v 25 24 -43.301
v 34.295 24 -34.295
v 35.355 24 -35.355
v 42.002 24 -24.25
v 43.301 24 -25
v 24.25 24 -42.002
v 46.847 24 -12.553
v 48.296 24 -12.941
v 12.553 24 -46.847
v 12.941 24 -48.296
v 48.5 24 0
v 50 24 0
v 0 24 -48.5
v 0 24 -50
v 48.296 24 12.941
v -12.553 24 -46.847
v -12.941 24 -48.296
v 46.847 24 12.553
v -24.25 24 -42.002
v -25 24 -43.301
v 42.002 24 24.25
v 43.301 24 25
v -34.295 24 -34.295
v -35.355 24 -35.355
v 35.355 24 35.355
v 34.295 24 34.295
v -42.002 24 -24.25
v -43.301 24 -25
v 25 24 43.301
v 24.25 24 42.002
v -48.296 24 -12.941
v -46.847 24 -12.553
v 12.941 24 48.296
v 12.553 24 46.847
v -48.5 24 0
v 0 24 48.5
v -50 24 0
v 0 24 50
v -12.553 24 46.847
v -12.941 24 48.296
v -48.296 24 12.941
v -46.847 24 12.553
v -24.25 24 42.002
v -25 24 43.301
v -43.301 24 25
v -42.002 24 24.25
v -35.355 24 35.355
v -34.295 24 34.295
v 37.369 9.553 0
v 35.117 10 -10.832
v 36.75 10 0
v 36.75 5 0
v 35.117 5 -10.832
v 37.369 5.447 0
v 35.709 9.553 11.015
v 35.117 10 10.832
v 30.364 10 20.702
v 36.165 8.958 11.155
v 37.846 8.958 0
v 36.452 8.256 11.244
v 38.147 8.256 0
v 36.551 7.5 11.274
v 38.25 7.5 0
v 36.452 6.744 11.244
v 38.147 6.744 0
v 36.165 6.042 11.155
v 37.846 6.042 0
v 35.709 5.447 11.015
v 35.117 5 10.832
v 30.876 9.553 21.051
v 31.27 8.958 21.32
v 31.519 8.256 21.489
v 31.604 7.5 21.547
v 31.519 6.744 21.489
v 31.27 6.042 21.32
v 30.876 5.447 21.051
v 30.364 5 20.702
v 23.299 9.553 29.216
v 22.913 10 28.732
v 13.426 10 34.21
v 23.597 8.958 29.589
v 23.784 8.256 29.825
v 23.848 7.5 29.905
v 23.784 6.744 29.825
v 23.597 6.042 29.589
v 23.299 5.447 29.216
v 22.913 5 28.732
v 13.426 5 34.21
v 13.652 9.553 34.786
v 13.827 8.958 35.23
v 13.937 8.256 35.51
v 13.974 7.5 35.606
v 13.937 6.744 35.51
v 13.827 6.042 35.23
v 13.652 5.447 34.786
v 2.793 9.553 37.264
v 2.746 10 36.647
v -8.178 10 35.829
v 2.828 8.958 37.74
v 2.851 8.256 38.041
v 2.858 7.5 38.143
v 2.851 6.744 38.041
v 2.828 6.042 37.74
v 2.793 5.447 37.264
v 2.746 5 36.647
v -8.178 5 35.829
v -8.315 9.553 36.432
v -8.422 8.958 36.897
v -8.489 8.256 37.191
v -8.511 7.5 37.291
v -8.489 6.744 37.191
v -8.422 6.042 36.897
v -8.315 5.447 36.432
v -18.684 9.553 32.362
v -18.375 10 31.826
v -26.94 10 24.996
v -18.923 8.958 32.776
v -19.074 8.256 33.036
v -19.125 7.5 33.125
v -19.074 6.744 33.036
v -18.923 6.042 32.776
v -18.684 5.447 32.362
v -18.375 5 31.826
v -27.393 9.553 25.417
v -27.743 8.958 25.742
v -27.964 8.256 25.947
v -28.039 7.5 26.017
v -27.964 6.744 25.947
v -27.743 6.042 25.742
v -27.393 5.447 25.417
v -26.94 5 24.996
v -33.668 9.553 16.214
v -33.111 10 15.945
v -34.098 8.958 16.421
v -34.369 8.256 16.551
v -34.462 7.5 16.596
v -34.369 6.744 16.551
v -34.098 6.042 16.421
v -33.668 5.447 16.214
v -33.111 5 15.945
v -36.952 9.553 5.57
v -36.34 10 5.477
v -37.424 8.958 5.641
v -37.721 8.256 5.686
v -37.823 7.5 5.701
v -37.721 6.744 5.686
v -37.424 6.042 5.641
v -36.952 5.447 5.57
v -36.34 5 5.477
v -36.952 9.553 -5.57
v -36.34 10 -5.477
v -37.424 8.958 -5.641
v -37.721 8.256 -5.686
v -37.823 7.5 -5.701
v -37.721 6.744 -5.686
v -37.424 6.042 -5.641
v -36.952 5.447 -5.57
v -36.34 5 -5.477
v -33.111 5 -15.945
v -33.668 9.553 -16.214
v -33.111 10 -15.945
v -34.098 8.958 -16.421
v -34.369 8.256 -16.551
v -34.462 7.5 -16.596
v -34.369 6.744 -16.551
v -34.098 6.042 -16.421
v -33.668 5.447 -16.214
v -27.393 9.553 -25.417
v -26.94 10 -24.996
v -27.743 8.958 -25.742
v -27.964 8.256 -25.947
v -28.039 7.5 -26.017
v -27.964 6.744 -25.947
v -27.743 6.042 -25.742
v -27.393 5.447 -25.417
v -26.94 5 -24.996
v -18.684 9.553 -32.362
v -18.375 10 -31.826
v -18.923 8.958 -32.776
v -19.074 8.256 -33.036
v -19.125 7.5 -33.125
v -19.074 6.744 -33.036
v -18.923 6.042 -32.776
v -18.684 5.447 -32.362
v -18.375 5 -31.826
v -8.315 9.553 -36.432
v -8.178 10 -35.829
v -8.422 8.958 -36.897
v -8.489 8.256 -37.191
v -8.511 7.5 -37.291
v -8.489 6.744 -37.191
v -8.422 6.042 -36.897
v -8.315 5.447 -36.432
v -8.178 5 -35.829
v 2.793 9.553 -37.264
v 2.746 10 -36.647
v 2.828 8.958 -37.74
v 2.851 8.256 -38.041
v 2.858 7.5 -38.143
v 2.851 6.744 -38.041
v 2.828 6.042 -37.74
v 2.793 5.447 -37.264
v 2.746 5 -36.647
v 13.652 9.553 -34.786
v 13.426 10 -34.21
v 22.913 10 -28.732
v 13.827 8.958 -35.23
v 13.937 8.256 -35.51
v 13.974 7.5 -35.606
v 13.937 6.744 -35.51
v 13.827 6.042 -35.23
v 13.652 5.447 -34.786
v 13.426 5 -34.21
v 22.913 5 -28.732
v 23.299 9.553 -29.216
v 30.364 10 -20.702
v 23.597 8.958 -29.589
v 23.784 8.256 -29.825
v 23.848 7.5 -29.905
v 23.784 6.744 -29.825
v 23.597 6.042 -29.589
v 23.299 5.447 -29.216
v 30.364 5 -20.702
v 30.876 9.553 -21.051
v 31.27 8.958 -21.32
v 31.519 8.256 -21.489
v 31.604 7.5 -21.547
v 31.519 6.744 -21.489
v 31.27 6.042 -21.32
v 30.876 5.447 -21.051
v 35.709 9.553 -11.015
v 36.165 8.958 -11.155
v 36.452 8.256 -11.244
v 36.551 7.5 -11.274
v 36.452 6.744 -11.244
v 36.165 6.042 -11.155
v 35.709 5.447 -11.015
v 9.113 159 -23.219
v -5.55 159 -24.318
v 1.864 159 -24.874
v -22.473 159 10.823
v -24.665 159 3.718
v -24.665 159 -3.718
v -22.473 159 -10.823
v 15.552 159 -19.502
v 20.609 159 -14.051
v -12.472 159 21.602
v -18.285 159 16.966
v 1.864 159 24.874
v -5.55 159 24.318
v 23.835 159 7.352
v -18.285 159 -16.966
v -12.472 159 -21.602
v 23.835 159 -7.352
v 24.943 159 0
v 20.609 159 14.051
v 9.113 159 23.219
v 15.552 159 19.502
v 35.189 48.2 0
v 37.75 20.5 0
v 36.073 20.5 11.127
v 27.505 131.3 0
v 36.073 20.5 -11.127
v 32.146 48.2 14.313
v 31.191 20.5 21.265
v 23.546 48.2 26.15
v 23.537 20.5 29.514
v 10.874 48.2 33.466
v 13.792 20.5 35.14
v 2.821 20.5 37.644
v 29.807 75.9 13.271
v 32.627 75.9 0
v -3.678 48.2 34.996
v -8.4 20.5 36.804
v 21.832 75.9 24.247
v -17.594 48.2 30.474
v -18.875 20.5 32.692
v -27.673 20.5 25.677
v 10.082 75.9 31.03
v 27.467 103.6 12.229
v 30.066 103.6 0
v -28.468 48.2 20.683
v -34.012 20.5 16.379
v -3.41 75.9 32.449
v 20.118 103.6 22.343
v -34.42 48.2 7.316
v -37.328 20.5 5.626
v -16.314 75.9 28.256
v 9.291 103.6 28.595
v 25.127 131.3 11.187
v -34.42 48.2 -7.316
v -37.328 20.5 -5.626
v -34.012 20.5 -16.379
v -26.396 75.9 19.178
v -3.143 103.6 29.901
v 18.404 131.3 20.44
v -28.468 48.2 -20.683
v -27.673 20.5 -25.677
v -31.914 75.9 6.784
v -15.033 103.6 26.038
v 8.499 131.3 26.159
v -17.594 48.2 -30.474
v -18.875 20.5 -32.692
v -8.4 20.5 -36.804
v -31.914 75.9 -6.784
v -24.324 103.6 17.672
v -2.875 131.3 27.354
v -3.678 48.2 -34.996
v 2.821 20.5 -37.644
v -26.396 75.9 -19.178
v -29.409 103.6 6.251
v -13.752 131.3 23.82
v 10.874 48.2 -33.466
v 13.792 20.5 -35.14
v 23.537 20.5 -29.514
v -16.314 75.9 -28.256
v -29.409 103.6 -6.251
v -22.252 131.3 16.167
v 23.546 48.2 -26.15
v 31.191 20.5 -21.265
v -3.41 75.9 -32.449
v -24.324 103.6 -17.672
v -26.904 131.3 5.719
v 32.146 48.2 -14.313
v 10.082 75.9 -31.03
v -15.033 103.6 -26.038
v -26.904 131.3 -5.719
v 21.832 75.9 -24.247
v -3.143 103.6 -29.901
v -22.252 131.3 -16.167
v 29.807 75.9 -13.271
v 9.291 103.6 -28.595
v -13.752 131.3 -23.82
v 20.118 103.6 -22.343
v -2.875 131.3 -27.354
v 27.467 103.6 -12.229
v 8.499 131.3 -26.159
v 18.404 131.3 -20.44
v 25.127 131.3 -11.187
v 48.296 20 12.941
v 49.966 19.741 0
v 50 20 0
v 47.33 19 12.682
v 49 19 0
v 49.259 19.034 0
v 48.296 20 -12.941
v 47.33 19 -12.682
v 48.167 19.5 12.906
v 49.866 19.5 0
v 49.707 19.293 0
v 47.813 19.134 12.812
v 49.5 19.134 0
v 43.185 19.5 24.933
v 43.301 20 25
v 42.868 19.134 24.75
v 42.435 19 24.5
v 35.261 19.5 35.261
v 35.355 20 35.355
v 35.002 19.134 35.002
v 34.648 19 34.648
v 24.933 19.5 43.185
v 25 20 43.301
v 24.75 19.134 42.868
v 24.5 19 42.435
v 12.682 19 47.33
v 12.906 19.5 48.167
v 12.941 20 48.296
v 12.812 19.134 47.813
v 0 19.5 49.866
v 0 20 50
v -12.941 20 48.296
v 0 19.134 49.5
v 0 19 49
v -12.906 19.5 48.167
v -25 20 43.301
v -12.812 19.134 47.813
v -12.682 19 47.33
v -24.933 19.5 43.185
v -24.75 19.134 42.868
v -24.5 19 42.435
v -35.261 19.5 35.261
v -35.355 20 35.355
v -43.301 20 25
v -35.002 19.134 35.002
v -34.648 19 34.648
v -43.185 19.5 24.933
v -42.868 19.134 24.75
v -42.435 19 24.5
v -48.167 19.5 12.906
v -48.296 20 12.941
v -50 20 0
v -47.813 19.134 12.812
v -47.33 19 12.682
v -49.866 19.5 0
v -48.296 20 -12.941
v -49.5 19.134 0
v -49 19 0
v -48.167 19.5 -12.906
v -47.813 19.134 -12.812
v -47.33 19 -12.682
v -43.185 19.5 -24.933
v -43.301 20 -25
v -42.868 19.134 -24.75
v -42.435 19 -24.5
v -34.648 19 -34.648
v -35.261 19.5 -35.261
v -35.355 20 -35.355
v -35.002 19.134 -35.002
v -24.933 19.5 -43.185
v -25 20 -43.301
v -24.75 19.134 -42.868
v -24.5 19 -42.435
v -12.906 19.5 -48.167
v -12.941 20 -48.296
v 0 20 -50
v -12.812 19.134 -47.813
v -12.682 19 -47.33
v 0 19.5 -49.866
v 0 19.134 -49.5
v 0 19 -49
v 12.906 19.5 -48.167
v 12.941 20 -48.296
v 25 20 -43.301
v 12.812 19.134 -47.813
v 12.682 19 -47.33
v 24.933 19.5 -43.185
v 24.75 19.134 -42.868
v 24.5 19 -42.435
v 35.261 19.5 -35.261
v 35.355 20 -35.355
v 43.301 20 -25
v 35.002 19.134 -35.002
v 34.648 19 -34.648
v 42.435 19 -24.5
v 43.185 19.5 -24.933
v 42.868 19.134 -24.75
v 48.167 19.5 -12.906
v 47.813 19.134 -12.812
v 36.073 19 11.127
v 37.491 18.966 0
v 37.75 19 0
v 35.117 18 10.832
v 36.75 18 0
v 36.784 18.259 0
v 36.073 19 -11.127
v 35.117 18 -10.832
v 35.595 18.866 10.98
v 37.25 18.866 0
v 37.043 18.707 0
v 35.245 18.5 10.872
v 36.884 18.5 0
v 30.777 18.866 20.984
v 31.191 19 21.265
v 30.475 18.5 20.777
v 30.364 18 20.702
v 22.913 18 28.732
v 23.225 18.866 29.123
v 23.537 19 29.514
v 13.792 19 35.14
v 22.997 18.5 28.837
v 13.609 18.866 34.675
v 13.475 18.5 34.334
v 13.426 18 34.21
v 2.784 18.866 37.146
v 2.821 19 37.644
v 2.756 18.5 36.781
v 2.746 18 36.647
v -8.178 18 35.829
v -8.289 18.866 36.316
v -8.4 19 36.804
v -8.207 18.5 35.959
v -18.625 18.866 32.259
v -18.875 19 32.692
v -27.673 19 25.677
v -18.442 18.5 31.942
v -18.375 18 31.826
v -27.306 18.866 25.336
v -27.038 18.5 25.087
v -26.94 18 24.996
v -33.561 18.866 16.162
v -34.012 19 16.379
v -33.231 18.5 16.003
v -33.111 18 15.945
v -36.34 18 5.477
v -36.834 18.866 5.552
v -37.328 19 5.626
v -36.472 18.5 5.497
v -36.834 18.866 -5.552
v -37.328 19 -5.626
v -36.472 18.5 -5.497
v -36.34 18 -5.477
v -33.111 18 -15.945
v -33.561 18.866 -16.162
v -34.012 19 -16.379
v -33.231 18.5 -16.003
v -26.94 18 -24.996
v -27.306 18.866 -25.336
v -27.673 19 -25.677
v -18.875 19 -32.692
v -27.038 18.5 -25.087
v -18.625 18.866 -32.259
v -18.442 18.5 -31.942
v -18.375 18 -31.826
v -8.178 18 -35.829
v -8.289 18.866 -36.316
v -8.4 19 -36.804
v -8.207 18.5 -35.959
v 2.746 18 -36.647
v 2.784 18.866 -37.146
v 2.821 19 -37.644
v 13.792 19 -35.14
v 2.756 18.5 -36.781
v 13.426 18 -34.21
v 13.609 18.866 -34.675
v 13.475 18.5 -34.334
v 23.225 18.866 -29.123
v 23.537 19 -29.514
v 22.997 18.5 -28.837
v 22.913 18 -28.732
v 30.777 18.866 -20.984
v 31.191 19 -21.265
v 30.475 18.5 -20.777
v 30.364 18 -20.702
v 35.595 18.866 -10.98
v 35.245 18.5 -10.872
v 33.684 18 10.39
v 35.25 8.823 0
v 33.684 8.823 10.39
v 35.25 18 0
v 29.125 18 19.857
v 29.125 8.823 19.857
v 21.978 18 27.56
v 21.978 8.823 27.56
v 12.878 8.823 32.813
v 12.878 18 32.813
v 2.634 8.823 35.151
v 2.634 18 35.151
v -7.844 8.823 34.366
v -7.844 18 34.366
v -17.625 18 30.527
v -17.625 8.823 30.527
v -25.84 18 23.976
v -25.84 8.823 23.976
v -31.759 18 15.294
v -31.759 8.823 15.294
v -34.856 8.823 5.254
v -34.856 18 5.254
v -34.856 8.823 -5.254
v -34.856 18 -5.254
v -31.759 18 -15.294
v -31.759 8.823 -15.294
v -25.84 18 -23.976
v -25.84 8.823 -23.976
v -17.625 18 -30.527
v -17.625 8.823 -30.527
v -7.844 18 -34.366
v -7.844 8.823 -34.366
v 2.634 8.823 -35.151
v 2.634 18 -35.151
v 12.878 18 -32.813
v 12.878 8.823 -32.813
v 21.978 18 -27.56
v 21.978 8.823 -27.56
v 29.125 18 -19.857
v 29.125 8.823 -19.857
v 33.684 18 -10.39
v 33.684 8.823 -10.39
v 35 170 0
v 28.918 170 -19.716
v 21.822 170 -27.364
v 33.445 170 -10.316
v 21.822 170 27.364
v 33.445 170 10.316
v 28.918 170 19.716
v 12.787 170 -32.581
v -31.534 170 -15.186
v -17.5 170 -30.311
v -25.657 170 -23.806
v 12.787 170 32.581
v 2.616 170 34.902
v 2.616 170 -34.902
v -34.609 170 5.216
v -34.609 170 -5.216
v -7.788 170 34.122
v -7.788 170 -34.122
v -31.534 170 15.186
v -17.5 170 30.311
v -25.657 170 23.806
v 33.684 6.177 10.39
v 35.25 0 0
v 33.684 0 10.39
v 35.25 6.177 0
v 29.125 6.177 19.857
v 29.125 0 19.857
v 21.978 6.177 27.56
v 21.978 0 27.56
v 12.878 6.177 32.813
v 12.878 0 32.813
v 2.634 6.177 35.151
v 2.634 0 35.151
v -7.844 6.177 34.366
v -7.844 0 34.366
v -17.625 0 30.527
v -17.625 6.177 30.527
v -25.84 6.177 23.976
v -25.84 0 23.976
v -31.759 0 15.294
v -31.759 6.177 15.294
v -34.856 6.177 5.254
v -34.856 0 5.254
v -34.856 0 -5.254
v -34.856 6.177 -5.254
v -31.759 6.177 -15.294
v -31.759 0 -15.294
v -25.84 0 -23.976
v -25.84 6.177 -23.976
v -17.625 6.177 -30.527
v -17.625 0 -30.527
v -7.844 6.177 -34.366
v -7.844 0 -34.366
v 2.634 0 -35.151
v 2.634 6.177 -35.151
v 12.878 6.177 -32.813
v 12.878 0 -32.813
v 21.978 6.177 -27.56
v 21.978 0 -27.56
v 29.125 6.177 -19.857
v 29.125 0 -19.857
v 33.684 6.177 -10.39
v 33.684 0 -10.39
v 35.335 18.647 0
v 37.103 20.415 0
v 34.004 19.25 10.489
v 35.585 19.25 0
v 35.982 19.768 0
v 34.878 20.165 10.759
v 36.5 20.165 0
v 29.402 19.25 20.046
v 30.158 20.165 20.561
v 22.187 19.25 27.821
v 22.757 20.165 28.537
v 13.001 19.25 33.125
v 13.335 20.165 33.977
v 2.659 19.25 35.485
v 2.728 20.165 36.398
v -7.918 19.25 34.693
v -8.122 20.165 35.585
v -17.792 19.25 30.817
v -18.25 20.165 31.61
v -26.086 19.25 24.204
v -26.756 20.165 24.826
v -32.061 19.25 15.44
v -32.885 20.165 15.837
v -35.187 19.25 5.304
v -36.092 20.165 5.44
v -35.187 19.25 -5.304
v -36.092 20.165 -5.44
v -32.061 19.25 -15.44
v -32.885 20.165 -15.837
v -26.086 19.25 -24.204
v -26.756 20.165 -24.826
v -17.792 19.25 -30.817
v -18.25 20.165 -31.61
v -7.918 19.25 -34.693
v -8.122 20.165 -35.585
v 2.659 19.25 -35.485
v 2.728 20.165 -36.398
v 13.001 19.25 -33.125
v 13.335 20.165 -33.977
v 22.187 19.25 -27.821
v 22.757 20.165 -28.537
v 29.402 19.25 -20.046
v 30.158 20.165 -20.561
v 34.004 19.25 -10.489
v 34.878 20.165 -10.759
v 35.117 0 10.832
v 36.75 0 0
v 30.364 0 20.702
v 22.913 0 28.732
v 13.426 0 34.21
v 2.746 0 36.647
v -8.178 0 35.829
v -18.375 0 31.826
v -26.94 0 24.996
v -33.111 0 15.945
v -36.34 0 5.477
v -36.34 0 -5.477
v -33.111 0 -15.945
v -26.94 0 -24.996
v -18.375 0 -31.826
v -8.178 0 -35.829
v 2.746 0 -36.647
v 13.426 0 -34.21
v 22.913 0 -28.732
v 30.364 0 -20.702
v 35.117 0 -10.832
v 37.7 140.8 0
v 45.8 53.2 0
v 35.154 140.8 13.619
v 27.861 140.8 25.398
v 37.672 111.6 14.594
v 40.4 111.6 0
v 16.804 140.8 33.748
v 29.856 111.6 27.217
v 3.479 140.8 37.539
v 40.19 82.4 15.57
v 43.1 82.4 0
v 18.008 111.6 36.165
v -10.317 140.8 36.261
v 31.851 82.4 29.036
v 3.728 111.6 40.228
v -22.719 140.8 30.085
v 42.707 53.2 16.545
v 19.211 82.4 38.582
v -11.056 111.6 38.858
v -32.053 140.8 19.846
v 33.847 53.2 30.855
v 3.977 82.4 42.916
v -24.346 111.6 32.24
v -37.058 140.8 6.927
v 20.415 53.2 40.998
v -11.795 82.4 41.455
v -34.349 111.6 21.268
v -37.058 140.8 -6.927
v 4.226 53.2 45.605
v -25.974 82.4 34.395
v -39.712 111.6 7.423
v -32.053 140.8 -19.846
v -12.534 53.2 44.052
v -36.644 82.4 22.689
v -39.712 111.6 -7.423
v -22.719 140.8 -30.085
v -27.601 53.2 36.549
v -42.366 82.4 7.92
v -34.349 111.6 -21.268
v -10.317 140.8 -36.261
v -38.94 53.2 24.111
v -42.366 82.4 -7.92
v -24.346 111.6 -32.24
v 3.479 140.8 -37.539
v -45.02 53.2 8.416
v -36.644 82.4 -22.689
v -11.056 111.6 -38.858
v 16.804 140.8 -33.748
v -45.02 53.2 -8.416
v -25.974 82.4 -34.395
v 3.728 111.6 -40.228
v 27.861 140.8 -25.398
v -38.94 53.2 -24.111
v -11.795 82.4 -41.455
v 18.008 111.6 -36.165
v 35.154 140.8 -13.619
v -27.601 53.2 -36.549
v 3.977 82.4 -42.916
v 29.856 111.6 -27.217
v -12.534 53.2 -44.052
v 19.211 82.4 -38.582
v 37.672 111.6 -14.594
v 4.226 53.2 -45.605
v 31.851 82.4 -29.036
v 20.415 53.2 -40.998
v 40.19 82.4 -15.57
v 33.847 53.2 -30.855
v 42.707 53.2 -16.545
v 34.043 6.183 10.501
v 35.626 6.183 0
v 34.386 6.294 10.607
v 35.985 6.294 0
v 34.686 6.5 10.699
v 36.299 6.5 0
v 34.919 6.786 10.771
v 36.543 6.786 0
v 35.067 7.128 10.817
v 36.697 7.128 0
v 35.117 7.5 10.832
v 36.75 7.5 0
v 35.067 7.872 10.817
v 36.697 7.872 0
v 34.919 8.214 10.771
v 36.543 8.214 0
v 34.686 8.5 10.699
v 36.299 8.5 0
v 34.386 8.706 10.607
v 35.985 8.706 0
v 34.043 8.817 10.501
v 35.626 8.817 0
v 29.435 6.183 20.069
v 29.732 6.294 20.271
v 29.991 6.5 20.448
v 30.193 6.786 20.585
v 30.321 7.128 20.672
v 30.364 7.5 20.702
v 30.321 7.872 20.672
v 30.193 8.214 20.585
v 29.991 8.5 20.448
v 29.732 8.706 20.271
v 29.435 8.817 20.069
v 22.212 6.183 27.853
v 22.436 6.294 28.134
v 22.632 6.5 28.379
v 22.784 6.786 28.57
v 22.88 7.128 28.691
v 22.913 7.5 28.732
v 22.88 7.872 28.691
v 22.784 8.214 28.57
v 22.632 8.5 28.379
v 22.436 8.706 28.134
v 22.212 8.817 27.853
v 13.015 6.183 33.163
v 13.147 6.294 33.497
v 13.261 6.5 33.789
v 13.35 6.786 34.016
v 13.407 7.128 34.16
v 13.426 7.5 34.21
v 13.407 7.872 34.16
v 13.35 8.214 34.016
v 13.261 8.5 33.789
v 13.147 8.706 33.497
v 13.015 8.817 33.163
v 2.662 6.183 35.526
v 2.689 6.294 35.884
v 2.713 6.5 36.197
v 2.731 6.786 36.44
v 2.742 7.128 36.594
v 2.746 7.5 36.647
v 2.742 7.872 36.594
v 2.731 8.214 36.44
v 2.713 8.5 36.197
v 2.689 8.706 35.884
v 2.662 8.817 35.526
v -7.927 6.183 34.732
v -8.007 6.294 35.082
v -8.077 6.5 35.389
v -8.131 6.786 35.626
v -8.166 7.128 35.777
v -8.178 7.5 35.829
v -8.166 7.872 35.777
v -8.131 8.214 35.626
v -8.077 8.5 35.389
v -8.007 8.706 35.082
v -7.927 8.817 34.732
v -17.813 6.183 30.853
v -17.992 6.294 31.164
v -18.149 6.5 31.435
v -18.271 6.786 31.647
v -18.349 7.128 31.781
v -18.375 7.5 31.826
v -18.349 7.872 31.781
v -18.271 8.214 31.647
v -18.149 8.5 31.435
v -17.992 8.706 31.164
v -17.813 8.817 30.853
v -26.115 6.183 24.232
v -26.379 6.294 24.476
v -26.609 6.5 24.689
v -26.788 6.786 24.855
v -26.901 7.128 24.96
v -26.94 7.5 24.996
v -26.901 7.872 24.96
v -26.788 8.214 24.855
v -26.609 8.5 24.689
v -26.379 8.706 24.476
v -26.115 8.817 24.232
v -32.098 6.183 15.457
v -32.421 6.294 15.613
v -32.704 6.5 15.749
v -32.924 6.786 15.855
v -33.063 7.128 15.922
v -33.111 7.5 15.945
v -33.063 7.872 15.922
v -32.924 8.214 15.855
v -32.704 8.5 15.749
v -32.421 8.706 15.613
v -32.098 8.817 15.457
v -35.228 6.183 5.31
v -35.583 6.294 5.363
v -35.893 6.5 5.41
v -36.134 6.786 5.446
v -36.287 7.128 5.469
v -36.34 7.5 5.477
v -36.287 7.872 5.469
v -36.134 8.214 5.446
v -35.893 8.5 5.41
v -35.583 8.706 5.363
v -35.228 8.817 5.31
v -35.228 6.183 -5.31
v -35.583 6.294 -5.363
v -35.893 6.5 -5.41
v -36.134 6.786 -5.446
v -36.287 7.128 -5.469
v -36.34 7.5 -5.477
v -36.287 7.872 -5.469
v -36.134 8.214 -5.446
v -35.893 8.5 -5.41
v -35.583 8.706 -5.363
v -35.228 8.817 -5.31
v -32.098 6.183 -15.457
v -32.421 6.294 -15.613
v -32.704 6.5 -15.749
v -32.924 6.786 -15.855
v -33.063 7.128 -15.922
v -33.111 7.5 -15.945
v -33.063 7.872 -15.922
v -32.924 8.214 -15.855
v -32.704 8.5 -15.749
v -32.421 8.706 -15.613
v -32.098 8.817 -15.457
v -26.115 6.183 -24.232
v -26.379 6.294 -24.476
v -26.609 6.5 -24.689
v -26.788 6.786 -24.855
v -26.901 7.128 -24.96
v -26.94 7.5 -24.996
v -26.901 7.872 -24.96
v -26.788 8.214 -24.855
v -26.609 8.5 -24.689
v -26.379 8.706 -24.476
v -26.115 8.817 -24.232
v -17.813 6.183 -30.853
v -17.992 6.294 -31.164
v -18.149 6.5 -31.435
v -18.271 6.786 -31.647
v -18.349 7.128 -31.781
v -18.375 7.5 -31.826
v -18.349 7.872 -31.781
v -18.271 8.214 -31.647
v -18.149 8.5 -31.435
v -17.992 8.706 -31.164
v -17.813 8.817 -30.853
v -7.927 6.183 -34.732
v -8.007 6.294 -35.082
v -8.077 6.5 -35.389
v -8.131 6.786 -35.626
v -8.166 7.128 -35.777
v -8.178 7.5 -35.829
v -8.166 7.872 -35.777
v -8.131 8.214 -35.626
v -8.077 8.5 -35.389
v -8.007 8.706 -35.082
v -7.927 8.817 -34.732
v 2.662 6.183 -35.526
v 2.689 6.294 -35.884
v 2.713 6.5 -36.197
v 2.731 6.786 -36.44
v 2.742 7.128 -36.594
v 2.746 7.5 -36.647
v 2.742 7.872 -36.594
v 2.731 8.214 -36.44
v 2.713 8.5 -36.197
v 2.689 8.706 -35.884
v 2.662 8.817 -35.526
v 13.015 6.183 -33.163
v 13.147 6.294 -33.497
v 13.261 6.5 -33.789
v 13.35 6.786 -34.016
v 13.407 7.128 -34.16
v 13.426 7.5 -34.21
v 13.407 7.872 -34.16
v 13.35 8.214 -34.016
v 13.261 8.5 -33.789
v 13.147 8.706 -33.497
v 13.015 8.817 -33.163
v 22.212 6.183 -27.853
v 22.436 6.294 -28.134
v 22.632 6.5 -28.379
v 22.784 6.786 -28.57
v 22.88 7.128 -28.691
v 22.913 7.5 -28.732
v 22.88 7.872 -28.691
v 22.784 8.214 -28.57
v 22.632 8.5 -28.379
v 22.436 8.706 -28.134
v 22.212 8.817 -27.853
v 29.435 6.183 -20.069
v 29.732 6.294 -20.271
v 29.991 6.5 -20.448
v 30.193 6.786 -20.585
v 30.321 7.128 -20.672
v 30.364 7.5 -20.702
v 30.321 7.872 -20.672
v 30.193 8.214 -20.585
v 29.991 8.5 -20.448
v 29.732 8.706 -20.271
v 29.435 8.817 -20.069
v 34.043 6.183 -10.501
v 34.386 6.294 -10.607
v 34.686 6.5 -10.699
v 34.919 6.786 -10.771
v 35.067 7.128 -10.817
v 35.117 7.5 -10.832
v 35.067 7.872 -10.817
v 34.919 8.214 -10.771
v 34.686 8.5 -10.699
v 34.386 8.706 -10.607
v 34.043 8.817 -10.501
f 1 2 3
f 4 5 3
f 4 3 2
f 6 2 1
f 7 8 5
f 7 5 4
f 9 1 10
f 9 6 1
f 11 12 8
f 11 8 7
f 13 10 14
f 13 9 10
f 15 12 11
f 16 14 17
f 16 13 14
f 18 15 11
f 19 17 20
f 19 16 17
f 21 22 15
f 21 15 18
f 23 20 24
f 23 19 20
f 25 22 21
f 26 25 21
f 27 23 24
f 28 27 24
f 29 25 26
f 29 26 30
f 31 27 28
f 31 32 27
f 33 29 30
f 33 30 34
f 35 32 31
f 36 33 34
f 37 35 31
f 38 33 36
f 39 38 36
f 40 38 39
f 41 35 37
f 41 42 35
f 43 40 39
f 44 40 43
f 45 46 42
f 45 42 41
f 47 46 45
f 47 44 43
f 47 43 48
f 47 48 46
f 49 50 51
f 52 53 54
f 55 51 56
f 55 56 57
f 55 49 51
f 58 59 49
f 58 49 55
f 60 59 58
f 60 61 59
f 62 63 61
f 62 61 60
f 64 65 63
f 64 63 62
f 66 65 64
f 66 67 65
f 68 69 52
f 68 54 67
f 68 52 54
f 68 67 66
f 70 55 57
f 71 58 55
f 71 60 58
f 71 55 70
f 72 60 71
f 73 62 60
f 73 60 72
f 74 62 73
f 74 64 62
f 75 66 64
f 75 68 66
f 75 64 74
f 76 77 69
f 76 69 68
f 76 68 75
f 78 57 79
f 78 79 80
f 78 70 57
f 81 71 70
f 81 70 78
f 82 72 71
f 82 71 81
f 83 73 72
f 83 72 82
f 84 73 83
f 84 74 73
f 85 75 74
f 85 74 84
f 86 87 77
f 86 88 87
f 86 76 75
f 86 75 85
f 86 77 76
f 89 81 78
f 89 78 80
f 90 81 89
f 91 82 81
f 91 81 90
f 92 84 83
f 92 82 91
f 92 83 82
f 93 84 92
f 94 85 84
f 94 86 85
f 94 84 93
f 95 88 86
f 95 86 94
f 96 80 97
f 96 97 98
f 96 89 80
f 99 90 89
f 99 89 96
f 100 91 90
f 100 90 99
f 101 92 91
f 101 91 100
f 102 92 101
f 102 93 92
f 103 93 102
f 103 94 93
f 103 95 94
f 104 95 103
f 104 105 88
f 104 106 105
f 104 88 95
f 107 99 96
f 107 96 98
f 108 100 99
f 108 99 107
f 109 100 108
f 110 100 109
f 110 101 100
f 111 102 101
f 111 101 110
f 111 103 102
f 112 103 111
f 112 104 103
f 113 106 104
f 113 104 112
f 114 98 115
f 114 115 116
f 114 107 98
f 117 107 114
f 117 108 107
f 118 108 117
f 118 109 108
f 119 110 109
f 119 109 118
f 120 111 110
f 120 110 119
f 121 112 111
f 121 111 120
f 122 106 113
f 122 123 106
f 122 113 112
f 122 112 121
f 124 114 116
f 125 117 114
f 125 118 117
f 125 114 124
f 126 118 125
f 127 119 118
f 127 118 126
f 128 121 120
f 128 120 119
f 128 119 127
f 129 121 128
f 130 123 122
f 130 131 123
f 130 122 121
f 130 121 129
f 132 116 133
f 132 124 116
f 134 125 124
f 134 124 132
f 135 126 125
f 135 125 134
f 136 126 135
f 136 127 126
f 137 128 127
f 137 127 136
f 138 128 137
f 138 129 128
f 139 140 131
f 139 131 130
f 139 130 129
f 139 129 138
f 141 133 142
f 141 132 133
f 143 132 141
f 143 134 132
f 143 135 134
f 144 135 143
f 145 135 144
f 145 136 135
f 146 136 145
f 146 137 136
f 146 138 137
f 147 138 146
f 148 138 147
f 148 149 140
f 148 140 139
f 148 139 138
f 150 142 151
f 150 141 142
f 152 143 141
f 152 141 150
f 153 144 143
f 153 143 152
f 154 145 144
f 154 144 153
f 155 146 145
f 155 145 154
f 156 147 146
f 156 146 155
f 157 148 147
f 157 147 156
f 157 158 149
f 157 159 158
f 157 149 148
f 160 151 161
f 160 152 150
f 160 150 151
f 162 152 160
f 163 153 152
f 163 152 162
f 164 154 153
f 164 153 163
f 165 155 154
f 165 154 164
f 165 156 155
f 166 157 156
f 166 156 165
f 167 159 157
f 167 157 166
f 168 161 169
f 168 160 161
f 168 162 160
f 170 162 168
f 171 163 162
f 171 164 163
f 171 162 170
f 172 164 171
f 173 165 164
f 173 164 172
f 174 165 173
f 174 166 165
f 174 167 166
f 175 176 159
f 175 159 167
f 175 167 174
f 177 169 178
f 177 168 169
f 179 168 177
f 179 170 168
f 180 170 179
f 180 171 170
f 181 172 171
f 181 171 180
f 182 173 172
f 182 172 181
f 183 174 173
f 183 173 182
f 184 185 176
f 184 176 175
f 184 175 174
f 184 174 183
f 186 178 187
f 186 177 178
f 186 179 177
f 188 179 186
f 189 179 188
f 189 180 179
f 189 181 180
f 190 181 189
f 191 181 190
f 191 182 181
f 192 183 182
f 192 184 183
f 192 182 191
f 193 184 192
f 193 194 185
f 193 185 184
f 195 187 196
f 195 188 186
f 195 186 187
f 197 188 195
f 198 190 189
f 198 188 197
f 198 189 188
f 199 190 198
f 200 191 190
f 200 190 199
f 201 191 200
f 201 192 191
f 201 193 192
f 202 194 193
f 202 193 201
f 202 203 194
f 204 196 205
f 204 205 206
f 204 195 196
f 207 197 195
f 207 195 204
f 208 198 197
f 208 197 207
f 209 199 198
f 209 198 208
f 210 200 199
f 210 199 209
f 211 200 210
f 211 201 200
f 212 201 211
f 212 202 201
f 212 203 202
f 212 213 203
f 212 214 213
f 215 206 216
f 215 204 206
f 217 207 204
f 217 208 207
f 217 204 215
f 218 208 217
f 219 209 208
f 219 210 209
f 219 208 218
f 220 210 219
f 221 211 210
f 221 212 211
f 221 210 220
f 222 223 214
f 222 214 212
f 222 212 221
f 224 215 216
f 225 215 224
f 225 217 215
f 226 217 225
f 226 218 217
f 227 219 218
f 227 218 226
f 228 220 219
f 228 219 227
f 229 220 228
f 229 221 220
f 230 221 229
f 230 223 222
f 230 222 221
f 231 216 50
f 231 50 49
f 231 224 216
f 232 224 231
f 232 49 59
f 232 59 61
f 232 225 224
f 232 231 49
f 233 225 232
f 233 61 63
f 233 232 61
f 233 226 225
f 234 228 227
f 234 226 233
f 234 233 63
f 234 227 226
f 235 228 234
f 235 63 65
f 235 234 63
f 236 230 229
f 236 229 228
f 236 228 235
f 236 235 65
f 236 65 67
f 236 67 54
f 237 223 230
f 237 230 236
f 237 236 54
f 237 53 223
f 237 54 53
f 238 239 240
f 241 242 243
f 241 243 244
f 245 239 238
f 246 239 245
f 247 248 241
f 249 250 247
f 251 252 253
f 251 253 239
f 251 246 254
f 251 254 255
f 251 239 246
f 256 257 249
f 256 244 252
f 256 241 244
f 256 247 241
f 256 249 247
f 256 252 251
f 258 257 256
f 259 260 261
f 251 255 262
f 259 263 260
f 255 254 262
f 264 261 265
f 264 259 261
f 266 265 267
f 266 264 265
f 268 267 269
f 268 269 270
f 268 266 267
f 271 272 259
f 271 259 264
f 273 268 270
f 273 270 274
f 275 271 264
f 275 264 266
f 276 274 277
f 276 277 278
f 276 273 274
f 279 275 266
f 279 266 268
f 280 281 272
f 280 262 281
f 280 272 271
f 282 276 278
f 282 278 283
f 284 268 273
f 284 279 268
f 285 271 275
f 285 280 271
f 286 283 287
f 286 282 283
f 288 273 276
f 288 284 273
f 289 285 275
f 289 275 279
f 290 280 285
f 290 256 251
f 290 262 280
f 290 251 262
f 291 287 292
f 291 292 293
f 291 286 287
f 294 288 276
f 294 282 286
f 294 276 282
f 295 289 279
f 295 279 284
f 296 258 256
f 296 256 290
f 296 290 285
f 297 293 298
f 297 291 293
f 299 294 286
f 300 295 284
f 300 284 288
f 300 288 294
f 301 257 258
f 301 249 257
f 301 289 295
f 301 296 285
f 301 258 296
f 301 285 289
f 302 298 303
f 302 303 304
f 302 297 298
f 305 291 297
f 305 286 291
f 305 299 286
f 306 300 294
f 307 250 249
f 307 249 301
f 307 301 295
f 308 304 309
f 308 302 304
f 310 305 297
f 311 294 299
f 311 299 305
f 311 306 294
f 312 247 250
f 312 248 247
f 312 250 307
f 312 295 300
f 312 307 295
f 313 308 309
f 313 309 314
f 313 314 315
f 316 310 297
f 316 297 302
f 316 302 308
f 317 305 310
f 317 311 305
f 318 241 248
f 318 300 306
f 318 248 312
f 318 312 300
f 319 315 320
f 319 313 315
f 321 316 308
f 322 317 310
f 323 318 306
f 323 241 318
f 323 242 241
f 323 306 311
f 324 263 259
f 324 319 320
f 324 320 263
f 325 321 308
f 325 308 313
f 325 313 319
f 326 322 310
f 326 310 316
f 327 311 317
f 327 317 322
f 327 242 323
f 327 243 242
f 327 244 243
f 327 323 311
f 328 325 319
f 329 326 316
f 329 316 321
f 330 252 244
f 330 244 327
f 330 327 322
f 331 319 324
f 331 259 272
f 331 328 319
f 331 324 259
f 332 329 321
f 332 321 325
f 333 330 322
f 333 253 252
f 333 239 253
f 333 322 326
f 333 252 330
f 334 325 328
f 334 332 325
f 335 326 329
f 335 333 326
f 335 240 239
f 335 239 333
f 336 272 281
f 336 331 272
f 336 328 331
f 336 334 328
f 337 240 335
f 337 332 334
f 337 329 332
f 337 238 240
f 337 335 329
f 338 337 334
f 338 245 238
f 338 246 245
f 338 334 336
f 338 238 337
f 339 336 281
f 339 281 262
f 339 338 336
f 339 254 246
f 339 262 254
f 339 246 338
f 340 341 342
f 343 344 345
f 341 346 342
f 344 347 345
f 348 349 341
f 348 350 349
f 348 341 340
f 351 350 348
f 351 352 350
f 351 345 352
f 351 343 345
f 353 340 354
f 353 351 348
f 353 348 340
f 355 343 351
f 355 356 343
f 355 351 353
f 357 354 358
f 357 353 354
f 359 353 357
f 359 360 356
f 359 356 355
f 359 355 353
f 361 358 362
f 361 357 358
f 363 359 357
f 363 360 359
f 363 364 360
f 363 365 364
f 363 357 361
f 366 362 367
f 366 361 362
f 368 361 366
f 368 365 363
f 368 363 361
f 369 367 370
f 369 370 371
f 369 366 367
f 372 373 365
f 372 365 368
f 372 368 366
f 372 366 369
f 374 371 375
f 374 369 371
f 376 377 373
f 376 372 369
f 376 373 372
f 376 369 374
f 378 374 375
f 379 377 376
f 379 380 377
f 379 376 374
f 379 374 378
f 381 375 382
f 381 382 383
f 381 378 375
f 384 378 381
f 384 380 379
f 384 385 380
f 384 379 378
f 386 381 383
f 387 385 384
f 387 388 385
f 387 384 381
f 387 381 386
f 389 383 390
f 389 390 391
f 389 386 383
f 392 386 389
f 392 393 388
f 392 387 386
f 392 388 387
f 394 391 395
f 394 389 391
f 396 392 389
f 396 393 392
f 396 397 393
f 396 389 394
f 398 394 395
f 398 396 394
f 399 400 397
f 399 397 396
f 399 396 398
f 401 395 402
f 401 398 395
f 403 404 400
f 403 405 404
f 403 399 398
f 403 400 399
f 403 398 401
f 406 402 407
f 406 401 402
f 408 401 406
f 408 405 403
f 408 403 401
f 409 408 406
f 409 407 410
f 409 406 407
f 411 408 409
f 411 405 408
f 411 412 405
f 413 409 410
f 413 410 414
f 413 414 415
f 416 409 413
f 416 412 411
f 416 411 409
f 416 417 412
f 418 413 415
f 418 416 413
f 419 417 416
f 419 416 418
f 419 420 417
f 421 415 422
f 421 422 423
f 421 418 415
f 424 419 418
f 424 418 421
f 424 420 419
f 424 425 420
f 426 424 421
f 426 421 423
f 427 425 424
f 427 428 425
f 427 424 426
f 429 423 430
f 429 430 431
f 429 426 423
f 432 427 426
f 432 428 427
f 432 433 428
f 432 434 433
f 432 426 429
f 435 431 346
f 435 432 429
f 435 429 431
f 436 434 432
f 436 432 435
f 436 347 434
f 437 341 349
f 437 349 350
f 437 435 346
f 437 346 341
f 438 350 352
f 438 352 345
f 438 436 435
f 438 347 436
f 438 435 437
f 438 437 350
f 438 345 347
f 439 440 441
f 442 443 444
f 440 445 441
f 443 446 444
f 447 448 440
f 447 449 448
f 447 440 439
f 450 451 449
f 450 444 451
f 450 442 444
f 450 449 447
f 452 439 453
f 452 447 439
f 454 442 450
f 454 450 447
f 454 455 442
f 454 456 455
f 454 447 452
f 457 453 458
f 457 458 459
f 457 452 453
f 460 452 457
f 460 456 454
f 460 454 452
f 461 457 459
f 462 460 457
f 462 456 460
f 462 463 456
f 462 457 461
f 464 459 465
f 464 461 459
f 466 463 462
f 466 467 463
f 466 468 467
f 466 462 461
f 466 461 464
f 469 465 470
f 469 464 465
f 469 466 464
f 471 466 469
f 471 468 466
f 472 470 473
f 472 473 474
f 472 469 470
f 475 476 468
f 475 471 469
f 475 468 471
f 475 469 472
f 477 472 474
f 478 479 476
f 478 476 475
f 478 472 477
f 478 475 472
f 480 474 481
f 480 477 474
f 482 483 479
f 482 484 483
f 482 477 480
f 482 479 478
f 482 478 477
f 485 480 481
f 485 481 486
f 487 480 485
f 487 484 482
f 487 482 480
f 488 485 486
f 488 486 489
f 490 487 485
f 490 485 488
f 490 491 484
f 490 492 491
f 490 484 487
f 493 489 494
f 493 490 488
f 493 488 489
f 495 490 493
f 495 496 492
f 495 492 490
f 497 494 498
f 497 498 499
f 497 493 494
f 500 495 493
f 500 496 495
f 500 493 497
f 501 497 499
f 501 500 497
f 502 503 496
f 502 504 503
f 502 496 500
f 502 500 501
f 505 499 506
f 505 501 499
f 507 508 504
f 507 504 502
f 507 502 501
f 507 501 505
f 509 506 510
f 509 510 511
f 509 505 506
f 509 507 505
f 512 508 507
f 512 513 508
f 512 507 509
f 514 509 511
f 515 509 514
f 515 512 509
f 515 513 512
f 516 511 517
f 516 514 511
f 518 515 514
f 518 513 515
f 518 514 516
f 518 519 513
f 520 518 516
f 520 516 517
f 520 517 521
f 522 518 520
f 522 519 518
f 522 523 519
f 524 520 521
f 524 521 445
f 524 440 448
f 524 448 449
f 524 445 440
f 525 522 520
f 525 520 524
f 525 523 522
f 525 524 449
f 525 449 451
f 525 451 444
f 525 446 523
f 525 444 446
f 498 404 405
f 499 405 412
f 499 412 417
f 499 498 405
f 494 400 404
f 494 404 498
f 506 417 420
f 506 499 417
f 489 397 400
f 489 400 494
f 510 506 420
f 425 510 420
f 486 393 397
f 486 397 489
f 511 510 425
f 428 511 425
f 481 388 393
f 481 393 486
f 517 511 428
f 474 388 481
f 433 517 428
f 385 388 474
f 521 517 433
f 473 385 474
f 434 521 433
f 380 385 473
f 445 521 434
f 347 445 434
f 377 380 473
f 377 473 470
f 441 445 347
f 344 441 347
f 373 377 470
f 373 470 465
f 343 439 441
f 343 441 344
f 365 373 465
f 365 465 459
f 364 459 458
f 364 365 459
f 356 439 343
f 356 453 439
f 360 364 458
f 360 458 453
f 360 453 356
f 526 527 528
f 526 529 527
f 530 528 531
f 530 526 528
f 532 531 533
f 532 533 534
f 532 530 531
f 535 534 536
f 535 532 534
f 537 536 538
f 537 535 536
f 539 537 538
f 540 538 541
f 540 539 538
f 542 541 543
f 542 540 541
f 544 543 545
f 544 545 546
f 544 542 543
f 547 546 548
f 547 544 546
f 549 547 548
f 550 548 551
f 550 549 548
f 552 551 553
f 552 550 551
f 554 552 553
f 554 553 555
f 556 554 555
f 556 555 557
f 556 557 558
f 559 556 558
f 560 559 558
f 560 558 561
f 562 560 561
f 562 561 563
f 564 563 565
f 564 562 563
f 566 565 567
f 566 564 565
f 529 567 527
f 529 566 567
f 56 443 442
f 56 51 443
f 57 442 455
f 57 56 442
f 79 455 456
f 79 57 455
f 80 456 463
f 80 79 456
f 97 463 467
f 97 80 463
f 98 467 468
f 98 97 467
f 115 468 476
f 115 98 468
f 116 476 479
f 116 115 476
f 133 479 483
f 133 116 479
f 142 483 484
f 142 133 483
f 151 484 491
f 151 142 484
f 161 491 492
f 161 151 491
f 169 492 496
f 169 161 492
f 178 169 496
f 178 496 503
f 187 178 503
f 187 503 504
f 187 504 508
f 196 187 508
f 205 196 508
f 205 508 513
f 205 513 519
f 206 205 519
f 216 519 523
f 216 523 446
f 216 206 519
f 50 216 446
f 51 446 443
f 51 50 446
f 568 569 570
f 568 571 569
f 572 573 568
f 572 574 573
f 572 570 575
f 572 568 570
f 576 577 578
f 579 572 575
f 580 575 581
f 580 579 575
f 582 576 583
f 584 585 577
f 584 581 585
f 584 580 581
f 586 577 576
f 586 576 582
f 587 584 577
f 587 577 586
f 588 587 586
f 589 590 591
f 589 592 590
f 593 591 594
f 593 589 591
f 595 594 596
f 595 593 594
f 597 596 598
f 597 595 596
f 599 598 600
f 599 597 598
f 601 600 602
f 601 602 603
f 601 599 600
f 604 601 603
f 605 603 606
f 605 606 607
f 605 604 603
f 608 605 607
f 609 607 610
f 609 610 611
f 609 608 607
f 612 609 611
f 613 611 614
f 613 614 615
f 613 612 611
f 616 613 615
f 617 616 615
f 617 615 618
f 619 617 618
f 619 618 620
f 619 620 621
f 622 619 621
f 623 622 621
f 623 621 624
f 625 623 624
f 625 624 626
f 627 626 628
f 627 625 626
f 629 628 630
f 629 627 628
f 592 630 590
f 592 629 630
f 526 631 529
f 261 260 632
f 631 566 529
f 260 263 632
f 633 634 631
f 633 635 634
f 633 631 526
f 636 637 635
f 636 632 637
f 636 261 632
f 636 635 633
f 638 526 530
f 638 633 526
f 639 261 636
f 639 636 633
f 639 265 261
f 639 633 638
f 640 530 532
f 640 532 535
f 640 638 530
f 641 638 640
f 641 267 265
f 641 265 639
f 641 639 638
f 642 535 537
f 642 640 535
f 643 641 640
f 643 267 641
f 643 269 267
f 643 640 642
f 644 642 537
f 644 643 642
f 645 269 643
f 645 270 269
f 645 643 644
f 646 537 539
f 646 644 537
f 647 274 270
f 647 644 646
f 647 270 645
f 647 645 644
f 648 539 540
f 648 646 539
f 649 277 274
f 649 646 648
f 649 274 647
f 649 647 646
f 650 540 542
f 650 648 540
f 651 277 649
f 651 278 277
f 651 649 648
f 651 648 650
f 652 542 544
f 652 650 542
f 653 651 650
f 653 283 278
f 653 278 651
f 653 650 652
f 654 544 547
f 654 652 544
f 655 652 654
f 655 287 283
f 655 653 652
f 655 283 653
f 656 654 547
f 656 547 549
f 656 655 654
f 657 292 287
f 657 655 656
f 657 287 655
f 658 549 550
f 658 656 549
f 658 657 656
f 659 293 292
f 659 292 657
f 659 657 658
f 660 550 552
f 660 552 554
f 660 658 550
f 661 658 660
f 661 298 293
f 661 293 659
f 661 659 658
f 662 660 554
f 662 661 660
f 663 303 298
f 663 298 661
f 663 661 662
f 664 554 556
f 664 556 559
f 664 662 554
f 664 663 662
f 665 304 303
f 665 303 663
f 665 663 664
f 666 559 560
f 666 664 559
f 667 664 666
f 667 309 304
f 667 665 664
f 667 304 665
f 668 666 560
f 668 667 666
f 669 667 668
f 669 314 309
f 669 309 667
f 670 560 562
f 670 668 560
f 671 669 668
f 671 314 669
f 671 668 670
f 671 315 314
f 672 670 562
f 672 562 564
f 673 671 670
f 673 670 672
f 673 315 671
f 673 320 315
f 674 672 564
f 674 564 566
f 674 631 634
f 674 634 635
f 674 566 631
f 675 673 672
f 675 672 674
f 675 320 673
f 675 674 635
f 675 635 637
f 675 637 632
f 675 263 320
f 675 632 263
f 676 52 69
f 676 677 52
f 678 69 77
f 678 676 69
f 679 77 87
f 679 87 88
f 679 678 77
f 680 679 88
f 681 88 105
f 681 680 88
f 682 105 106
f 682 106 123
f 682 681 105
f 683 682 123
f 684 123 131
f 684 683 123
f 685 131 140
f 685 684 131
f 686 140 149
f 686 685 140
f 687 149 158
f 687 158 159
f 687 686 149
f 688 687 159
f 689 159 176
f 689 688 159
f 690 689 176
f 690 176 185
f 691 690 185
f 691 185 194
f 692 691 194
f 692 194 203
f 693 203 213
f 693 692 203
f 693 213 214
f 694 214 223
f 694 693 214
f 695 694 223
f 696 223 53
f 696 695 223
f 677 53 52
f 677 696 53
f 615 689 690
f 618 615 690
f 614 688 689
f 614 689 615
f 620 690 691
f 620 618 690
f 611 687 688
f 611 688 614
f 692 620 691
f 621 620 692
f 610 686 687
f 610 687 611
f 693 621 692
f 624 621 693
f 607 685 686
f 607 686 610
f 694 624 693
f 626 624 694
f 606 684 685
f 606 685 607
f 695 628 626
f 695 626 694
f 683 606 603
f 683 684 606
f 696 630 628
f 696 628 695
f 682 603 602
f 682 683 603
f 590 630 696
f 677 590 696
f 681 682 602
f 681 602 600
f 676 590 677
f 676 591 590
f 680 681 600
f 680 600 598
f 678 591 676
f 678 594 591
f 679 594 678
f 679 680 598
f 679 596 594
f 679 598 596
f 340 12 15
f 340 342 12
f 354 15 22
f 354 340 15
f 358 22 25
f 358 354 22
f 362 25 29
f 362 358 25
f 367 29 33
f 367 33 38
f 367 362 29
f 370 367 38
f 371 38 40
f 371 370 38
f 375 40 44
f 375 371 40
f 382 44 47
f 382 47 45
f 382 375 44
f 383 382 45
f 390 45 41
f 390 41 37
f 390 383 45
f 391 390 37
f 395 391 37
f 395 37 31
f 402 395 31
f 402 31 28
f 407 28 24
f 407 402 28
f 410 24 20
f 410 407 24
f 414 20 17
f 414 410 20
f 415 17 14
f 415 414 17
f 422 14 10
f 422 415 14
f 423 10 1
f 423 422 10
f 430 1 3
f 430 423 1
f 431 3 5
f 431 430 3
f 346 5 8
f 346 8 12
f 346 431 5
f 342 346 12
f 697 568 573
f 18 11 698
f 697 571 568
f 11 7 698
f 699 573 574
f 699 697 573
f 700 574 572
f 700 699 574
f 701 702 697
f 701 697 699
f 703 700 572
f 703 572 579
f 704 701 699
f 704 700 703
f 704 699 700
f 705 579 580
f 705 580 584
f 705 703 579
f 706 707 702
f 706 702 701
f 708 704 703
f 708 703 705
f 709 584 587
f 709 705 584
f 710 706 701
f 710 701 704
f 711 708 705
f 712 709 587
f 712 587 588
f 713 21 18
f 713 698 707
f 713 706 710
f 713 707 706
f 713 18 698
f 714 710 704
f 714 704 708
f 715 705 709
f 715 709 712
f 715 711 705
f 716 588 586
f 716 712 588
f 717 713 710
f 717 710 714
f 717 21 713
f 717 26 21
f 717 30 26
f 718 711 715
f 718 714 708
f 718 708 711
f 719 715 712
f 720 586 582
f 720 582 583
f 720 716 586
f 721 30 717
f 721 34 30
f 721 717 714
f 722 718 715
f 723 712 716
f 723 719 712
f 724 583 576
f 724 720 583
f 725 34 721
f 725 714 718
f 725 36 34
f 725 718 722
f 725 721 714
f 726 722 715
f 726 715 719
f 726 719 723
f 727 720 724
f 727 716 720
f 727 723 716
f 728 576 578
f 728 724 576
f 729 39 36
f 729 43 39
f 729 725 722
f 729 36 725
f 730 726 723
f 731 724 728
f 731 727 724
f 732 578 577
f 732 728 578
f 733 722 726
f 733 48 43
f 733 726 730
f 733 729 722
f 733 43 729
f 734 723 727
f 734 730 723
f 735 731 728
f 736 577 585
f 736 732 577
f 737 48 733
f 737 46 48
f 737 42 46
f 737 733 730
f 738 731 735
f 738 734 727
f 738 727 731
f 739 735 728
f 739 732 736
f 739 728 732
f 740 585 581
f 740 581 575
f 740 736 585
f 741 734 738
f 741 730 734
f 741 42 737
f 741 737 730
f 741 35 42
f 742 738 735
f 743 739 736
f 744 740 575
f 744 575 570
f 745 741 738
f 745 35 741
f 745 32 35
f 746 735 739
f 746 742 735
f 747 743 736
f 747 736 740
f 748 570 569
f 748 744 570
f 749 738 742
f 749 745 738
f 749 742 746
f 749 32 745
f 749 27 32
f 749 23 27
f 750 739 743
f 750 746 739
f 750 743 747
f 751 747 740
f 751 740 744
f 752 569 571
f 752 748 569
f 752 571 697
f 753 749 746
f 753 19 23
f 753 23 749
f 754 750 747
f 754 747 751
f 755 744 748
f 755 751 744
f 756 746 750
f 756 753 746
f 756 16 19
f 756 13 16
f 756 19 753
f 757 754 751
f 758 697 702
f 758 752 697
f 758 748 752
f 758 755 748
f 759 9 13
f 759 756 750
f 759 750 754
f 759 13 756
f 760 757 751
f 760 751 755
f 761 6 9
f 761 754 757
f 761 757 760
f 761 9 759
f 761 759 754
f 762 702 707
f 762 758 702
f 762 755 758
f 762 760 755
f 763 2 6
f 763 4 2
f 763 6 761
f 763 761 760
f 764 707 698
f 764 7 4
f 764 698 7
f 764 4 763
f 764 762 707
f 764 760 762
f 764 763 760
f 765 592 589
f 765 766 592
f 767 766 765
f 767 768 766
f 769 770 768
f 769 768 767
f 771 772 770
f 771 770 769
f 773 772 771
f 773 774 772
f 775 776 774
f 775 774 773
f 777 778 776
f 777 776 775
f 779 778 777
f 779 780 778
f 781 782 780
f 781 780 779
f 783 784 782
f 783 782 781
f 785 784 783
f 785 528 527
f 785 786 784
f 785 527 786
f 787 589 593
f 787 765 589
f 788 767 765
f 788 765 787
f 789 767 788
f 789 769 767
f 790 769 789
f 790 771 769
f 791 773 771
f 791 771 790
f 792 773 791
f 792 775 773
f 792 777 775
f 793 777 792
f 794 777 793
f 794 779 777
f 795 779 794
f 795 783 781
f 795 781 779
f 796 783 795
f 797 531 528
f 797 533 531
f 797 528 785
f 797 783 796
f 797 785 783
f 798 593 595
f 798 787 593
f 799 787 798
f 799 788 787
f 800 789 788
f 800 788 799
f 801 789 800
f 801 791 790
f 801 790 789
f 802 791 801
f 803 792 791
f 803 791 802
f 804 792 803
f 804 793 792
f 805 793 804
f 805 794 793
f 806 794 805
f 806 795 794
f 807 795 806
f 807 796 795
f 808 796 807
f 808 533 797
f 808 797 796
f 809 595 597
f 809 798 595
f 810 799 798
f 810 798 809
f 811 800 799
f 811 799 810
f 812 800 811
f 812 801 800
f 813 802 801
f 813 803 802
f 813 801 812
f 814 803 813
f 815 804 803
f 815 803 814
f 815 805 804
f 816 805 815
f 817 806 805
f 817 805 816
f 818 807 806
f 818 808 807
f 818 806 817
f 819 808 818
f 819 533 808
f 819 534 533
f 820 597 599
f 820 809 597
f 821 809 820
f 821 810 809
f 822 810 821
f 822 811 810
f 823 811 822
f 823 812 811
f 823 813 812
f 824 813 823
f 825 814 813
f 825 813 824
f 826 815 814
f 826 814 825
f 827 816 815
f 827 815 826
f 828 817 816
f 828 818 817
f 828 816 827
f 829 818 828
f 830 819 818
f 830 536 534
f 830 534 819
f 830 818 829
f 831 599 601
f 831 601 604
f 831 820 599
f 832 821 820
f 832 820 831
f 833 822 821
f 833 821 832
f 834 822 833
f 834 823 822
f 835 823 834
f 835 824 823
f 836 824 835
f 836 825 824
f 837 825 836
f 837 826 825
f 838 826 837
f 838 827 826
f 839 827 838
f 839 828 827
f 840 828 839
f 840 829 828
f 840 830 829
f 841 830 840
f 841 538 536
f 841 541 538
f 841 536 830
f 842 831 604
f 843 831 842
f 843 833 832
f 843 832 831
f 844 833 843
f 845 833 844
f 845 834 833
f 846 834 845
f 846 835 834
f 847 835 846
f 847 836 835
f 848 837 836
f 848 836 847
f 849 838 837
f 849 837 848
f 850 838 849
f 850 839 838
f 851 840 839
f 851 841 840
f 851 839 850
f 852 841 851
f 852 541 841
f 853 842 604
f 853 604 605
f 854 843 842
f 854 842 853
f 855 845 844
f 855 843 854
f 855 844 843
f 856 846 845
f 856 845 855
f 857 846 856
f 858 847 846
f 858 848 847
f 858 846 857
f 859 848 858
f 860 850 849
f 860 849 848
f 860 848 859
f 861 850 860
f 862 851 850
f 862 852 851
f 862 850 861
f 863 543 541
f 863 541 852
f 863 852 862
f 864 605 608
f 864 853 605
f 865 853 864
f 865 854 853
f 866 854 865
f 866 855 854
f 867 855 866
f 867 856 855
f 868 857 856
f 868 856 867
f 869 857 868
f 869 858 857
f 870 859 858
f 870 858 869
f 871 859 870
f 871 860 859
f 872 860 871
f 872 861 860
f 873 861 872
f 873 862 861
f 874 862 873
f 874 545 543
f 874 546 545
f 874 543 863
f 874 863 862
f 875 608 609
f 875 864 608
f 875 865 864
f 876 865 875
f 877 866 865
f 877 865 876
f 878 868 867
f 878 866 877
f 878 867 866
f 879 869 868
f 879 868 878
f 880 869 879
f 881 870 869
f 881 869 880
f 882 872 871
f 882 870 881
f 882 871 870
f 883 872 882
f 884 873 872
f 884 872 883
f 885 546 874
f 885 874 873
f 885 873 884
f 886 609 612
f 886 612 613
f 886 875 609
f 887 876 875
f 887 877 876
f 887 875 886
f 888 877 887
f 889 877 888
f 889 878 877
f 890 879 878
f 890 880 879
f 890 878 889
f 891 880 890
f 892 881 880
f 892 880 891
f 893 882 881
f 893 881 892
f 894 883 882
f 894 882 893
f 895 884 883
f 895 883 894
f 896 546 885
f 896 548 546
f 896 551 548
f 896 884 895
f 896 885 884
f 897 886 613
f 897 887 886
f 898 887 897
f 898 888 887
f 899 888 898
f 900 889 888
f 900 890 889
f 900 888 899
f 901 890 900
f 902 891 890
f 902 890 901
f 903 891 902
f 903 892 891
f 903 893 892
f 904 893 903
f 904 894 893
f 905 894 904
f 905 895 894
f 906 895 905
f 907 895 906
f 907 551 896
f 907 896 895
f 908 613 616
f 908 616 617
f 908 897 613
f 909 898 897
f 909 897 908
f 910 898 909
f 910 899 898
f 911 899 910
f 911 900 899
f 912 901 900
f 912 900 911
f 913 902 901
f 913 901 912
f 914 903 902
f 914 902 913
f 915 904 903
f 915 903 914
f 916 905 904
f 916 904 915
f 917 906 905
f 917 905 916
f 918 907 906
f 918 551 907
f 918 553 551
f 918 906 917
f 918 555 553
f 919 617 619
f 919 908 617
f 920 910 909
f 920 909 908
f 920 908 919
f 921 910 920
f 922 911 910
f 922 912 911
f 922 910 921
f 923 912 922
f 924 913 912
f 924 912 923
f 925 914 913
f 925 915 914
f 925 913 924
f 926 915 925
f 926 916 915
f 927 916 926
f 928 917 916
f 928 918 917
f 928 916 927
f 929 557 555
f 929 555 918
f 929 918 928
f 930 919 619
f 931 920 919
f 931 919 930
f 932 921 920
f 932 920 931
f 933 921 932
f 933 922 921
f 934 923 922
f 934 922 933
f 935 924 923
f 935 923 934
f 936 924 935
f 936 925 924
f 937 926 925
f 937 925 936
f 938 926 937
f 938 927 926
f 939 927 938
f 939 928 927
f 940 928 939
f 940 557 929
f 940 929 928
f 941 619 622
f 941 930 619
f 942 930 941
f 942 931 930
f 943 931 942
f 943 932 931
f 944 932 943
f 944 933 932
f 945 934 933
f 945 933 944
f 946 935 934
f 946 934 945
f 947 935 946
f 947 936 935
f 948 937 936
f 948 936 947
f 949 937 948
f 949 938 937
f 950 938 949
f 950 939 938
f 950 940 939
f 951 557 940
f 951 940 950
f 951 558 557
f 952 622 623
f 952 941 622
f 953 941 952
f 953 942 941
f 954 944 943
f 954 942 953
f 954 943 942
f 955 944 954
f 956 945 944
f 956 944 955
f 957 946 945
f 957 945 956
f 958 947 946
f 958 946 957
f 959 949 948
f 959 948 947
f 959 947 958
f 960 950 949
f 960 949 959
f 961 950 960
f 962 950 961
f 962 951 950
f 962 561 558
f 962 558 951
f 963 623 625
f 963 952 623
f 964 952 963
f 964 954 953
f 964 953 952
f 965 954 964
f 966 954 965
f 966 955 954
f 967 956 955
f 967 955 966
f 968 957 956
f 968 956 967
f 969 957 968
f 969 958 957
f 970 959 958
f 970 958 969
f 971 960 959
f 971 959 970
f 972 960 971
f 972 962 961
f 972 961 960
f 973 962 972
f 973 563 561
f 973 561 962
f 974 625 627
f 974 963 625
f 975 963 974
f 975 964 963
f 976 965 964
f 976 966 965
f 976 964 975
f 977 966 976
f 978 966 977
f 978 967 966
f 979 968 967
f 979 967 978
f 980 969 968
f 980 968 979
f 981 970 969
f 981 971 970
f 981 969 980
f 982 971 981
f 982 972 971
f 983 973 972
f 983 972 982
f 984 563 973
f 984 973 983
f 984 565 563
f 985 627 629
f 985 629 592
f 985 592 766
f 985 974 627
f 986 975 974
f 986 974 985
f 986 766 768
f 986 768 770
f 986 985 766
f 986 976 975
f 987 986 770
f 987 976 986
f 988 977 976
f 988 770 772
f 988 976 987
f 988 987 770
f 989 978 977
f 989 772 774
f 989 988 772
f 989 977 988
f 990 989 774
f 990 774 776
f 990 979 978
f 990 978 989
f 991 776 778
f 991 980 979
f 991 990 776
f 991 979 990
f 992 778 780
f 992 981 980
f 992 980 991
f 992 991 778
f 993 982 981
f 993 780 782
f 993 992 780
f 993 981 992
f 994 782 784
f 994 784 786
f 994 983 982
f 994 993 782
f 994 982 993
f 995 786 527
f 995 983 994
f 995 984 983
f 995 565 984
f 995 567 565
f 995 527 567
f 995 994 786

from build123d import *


with BuildPart() as part:
    # Sketch1 → Revolve1 (revolve)
    with BuildSketch(Plane.XY):
        with BuildLine():
            ThreePointArc((35.25, 18), (35.982233047, 19.767766953), (37.75, 20.5))
            Line((37.75, 20.5), (24.943493151, 159))
            Line((24.943493151, 159), (0, 159))
            Line((0, 159), (0, 170))
            Line((0, 170), (35, 170))
            Line((35, 170), (48.5, 24))
            Line((48.5, 24), (50, 24))
            Line((50, 24), (50, 20))
            ThreePointArc((50, 20), (49.707106781, 19.292893219), (49, 19))
            Line((49, 19), (37.75, 19))
            ThreePointArc((37.75, 19), (37.042893219, 18.707106781), (36.75, 18))
            Line((36.75, 18), (36.75, 10))
            ThreePointArc((36.75, 10), (38.25, 7.5), (36.75, 5))
            Line((36.75, 5), (36.75, 0))
            Line((36.75, 0), (35.25, 0))
            Line((35.25, 0), (35.25, 6.177124344))
            ThreePointArc((35.25, 6.177124344), (36.75, 7.5), (35.25, 8.822875656))
            Line((35.25, 8.822875656), (35.25, 18))
        make_face()
    revolve(axis=Axis((0, 170, 0), (0, -1, 0)))


solid = part.part
